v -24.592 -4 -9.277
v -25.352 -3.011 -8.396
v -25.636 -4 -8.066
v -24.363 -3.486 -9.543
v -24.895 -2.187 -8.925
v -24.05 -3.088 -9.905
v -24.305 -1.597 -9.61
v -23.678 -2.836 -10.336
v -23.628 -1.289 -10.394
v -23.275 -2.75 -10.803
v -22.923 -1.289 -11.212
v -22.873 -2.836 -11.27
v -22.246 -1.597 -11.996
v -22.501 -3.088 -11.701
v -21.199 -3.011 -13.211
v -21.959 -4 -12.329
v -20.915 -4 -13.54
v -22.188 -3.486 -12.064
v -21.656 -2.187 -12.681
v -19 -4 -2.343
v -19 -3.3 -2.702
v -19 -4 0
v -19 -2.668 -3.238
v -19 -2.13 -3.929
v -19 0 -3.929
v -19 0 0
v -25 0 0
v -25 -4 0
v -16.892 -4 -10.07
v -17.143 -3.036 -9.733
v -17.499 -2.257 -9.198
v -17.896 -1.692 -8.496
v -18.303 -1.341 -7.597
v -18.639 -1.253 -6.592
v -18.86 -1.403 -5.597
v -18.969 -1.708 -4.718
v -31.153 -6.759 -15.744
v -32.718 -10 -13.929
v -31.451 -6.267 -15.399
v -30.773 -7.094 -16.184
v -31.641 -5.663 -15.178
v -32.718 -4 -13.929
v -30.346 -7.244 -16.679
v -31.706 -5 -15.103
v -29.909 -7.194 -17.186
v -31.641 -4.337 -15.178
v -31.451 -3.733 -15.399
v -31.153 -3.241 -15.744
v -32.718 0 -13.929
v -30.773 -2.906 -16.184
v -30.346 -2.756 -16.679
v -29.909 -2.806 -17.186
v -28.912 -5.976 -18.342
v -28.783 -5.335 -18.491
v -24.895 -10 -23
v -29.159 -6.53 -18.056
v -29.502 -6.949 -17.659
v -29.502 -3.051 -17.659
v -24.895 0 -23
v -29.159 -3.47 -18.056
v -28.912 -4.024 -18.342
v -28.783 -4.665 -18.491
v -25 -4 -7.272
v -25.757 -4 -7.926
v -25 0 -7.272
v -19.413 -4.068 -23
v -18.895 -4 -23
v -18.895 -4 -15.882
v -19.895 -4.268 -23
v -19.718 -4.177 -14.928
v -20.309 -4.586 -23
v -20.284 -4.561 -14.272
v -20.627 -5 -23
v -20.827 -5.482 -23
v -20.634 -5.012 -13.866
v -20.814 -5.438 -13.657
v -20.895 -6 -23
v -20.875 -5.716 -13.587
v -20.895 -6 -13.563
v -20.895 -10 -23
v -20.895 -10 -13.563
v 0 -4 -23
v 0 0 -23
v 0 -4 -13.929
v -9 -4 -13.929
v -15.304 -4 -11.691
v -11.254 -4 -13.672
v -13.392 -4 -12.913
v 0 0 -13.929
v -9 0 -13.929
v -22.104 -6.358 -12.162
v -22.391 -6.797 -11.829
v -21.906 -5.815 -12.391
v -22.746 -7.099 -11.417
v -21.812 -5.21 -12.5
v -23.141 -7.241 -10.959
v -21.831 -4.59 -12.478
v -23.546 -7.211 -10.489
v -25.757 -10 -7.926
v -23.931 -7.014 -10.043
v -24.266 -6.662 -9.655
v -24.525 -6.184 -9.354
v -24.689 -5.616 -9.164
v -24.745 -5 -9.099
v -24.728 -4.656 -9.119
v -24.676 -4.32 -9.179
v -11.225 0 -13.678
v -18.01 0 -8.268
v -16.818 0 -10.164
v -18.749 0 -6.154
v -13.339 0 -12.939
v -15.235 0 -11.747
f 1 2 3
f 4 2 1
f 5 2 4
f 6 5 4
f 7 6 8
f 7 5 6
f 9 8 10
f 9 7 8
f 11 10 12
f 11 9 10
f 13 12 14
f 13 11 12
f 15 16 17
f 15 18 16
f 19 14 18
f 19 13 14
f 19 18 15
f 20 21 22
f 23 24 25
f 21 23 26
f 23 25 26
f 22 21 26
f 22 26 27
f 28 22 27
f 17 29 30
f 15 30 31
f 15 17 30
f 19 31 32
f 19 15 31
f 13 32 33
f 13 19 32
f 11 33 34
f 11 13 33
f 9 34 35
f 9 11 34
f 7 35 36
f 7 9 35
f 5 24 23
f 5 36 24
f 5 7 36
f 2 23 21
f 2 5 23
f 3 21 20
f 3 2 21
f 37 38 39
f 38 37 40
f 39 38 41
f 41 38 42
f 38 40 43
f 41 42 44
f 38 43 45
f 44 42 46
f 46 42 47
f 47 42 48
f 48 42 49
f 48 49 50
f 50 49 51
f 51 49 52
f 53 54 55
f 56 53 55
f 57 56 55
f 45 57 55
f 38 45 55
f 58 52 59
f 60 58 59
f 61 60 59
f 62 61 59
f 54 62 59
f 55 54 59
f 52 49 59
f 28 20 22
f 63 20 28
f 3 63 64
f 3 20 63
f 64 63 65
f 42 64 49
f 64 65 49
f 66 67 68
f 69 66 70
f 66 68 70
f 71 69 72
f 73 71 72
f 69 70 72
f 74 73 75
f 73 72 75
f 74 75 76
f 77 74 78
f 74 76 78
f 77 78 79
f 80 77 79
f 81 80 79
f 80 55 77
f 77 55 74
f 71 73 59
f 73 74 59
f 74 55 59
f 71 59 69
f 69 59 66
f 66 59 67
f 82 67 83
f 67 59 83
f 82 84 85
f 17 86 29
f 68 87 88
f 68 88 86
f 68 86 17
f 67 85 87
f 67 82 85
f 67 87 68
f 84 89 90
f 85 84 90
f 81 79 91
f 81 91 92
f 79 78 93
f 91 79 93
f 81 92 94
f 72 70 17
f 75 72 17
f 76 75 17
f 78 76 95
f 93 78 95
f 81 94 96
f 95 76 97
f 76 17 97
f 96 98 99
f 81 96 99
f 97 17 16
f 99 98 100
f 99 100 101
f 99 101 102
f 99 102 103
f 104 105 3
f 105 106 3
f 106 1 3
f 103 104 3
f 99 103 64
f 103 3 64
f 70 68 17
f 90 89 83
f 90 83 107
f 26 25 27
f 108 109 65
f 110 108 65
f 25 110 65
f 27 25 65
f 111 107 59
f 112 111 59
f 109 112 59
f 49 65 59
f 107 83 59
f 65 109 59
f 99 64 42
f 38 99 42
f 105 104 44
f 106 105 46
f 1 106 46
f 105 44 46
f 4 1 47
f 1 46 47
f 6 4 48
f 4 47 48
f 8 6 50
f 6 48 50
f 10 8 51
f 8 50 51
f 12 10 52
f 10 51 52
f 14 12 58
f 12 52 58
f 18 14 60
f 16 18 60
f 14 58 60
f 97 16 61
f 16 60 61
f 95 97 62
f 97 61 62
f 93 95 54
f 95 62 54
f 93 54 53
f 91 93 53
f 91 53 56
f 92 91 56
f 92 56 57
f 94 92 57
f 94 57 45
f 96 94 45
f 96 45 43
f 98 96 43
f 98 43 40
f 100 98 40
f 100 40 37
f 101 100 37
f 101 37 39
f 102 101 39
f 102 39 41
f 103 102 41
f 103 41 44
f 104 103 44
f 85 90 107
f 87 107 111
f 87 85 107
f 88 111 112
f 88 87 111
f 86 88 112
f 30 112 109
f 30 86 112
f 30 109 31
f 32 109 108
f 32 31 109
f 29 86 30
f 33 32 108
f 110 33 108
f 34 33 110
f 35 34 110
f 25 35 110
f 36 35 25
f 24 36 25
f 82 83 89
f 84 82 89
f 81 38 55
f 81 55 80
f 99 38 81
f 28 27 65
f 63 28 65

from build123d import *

# Parameters (mm, degrees)
BOSS_EXTRUDE1_DEPTH = 4
BOSS_EXTRUDE2_DEPTH = 6
SKETCH4_R           = 2.25
CUT_EXTRUDE1_DEPTH  = 36.318797722
CUT_EXTRUDE2_REACH  = 28.63
SKETCH5_R           = 3.75
FILLET1_R           = 10
FILLET3_R           = 2


with BuildPart() as part:
    # Sketch2 → Boss-Extrude1 (new body)
    with BuildSketch(Plane(origin=(0, 0, 0), x_dir=(1, 0, 0), z_dir=(0, 1, 0))):
        Polygon((-32.718226242, 13.928959815), (-24.894958744, 23), (0, 23), (0, 13.928959815), (-19, 13.928959815), (-19, 0), (-25, 0), (-25, 7.27241908), align=None)
    extrude(amount=-BOSS_EXTRUDE1_DEPTH)

    # Sketch3 → Boss-Extrude2 (add)
    with BuildSketch(Plane(origin=(0, -4, 0), x_dir=(-1, 0, 0), z_dir=(0, 1, 0))):
        Polygon((25.757269356, -7.92552177), (32.718226242, -13.928959815), (24.894958744, -23), (20.894958744, -23), (20.894958744, -13.563347009), align=None)
    extrude(amount=-BOSS_EXTRUDE2_DEPTH)

    # Sketch4 → Cut-Extrude1 (cut, through all)
    with BuildSketch(Plane(origin=(-25.651402317, 0, -22.122907398), x_dir=(-0.653102689208867, 0, 0.7572693558755339), z_dir=(-0.7572693558755339, 0, -0.653102689208867))):
        with Locations((7.020387118, -5)):
            Circle(SKETCH4_R)
    extrude(amount=-CUT_EXTRUDE1_DEPTH, mode=Mode.SUBTRACT)

    # Cut-Extrude2: up to this plane
    cut_extrude2_end = Plane(origin=(-19, -4, -13.928959815), z_dir=(1, 0, 0))
    # Sketch5 → Cut-Extrude2 (cut, up to the surface)
    with BuildSketch(Plane(origin=(-18.690445431, 0, -16.119469352), x_dir=(0.6531026892088669, 0, -0.757269355875534), z_dir=(0.757269355875534, 0, 0.6531026892088669)), mode=Mode.PRIVATE) as cut_extrude2_sk1:
        with Locations((-7.020387118, -5)):
            Circle(SKETCH5_R)
    cut_extrude2_tool1 = split(extrude(cut_extrude2_sk1.sketch, amount=CUT_EXTRUDE2_REACH, mode=Mode.PRIVATE), bisect_by=cut_extrude2_end, keep=Keep.BOTH, mode=Mode.PRIVATE)
    add(cut_extrude2_tool1.solids().sort_by_distance((-23.275479, -5, -10.803145))[0], mode=Mode.SUBTRACT)

    # Fillet1
    fillet1_edges = [part.edges().sort_by_distance(p)[0] for p in [
        (-19, -2, -13.928959815),
    ]]
    fillet(fillet1_edges, radius=FILLET1_R)

    # Fillet3
    fillet3_edges = [part.edges().sort_by_distance(p)[0] for p in [
        (-20.894958744, -4, -18.281673505),
    ]]
    fillet(fillet3_edges, radius=FILLET3_R)


solid = part.part
